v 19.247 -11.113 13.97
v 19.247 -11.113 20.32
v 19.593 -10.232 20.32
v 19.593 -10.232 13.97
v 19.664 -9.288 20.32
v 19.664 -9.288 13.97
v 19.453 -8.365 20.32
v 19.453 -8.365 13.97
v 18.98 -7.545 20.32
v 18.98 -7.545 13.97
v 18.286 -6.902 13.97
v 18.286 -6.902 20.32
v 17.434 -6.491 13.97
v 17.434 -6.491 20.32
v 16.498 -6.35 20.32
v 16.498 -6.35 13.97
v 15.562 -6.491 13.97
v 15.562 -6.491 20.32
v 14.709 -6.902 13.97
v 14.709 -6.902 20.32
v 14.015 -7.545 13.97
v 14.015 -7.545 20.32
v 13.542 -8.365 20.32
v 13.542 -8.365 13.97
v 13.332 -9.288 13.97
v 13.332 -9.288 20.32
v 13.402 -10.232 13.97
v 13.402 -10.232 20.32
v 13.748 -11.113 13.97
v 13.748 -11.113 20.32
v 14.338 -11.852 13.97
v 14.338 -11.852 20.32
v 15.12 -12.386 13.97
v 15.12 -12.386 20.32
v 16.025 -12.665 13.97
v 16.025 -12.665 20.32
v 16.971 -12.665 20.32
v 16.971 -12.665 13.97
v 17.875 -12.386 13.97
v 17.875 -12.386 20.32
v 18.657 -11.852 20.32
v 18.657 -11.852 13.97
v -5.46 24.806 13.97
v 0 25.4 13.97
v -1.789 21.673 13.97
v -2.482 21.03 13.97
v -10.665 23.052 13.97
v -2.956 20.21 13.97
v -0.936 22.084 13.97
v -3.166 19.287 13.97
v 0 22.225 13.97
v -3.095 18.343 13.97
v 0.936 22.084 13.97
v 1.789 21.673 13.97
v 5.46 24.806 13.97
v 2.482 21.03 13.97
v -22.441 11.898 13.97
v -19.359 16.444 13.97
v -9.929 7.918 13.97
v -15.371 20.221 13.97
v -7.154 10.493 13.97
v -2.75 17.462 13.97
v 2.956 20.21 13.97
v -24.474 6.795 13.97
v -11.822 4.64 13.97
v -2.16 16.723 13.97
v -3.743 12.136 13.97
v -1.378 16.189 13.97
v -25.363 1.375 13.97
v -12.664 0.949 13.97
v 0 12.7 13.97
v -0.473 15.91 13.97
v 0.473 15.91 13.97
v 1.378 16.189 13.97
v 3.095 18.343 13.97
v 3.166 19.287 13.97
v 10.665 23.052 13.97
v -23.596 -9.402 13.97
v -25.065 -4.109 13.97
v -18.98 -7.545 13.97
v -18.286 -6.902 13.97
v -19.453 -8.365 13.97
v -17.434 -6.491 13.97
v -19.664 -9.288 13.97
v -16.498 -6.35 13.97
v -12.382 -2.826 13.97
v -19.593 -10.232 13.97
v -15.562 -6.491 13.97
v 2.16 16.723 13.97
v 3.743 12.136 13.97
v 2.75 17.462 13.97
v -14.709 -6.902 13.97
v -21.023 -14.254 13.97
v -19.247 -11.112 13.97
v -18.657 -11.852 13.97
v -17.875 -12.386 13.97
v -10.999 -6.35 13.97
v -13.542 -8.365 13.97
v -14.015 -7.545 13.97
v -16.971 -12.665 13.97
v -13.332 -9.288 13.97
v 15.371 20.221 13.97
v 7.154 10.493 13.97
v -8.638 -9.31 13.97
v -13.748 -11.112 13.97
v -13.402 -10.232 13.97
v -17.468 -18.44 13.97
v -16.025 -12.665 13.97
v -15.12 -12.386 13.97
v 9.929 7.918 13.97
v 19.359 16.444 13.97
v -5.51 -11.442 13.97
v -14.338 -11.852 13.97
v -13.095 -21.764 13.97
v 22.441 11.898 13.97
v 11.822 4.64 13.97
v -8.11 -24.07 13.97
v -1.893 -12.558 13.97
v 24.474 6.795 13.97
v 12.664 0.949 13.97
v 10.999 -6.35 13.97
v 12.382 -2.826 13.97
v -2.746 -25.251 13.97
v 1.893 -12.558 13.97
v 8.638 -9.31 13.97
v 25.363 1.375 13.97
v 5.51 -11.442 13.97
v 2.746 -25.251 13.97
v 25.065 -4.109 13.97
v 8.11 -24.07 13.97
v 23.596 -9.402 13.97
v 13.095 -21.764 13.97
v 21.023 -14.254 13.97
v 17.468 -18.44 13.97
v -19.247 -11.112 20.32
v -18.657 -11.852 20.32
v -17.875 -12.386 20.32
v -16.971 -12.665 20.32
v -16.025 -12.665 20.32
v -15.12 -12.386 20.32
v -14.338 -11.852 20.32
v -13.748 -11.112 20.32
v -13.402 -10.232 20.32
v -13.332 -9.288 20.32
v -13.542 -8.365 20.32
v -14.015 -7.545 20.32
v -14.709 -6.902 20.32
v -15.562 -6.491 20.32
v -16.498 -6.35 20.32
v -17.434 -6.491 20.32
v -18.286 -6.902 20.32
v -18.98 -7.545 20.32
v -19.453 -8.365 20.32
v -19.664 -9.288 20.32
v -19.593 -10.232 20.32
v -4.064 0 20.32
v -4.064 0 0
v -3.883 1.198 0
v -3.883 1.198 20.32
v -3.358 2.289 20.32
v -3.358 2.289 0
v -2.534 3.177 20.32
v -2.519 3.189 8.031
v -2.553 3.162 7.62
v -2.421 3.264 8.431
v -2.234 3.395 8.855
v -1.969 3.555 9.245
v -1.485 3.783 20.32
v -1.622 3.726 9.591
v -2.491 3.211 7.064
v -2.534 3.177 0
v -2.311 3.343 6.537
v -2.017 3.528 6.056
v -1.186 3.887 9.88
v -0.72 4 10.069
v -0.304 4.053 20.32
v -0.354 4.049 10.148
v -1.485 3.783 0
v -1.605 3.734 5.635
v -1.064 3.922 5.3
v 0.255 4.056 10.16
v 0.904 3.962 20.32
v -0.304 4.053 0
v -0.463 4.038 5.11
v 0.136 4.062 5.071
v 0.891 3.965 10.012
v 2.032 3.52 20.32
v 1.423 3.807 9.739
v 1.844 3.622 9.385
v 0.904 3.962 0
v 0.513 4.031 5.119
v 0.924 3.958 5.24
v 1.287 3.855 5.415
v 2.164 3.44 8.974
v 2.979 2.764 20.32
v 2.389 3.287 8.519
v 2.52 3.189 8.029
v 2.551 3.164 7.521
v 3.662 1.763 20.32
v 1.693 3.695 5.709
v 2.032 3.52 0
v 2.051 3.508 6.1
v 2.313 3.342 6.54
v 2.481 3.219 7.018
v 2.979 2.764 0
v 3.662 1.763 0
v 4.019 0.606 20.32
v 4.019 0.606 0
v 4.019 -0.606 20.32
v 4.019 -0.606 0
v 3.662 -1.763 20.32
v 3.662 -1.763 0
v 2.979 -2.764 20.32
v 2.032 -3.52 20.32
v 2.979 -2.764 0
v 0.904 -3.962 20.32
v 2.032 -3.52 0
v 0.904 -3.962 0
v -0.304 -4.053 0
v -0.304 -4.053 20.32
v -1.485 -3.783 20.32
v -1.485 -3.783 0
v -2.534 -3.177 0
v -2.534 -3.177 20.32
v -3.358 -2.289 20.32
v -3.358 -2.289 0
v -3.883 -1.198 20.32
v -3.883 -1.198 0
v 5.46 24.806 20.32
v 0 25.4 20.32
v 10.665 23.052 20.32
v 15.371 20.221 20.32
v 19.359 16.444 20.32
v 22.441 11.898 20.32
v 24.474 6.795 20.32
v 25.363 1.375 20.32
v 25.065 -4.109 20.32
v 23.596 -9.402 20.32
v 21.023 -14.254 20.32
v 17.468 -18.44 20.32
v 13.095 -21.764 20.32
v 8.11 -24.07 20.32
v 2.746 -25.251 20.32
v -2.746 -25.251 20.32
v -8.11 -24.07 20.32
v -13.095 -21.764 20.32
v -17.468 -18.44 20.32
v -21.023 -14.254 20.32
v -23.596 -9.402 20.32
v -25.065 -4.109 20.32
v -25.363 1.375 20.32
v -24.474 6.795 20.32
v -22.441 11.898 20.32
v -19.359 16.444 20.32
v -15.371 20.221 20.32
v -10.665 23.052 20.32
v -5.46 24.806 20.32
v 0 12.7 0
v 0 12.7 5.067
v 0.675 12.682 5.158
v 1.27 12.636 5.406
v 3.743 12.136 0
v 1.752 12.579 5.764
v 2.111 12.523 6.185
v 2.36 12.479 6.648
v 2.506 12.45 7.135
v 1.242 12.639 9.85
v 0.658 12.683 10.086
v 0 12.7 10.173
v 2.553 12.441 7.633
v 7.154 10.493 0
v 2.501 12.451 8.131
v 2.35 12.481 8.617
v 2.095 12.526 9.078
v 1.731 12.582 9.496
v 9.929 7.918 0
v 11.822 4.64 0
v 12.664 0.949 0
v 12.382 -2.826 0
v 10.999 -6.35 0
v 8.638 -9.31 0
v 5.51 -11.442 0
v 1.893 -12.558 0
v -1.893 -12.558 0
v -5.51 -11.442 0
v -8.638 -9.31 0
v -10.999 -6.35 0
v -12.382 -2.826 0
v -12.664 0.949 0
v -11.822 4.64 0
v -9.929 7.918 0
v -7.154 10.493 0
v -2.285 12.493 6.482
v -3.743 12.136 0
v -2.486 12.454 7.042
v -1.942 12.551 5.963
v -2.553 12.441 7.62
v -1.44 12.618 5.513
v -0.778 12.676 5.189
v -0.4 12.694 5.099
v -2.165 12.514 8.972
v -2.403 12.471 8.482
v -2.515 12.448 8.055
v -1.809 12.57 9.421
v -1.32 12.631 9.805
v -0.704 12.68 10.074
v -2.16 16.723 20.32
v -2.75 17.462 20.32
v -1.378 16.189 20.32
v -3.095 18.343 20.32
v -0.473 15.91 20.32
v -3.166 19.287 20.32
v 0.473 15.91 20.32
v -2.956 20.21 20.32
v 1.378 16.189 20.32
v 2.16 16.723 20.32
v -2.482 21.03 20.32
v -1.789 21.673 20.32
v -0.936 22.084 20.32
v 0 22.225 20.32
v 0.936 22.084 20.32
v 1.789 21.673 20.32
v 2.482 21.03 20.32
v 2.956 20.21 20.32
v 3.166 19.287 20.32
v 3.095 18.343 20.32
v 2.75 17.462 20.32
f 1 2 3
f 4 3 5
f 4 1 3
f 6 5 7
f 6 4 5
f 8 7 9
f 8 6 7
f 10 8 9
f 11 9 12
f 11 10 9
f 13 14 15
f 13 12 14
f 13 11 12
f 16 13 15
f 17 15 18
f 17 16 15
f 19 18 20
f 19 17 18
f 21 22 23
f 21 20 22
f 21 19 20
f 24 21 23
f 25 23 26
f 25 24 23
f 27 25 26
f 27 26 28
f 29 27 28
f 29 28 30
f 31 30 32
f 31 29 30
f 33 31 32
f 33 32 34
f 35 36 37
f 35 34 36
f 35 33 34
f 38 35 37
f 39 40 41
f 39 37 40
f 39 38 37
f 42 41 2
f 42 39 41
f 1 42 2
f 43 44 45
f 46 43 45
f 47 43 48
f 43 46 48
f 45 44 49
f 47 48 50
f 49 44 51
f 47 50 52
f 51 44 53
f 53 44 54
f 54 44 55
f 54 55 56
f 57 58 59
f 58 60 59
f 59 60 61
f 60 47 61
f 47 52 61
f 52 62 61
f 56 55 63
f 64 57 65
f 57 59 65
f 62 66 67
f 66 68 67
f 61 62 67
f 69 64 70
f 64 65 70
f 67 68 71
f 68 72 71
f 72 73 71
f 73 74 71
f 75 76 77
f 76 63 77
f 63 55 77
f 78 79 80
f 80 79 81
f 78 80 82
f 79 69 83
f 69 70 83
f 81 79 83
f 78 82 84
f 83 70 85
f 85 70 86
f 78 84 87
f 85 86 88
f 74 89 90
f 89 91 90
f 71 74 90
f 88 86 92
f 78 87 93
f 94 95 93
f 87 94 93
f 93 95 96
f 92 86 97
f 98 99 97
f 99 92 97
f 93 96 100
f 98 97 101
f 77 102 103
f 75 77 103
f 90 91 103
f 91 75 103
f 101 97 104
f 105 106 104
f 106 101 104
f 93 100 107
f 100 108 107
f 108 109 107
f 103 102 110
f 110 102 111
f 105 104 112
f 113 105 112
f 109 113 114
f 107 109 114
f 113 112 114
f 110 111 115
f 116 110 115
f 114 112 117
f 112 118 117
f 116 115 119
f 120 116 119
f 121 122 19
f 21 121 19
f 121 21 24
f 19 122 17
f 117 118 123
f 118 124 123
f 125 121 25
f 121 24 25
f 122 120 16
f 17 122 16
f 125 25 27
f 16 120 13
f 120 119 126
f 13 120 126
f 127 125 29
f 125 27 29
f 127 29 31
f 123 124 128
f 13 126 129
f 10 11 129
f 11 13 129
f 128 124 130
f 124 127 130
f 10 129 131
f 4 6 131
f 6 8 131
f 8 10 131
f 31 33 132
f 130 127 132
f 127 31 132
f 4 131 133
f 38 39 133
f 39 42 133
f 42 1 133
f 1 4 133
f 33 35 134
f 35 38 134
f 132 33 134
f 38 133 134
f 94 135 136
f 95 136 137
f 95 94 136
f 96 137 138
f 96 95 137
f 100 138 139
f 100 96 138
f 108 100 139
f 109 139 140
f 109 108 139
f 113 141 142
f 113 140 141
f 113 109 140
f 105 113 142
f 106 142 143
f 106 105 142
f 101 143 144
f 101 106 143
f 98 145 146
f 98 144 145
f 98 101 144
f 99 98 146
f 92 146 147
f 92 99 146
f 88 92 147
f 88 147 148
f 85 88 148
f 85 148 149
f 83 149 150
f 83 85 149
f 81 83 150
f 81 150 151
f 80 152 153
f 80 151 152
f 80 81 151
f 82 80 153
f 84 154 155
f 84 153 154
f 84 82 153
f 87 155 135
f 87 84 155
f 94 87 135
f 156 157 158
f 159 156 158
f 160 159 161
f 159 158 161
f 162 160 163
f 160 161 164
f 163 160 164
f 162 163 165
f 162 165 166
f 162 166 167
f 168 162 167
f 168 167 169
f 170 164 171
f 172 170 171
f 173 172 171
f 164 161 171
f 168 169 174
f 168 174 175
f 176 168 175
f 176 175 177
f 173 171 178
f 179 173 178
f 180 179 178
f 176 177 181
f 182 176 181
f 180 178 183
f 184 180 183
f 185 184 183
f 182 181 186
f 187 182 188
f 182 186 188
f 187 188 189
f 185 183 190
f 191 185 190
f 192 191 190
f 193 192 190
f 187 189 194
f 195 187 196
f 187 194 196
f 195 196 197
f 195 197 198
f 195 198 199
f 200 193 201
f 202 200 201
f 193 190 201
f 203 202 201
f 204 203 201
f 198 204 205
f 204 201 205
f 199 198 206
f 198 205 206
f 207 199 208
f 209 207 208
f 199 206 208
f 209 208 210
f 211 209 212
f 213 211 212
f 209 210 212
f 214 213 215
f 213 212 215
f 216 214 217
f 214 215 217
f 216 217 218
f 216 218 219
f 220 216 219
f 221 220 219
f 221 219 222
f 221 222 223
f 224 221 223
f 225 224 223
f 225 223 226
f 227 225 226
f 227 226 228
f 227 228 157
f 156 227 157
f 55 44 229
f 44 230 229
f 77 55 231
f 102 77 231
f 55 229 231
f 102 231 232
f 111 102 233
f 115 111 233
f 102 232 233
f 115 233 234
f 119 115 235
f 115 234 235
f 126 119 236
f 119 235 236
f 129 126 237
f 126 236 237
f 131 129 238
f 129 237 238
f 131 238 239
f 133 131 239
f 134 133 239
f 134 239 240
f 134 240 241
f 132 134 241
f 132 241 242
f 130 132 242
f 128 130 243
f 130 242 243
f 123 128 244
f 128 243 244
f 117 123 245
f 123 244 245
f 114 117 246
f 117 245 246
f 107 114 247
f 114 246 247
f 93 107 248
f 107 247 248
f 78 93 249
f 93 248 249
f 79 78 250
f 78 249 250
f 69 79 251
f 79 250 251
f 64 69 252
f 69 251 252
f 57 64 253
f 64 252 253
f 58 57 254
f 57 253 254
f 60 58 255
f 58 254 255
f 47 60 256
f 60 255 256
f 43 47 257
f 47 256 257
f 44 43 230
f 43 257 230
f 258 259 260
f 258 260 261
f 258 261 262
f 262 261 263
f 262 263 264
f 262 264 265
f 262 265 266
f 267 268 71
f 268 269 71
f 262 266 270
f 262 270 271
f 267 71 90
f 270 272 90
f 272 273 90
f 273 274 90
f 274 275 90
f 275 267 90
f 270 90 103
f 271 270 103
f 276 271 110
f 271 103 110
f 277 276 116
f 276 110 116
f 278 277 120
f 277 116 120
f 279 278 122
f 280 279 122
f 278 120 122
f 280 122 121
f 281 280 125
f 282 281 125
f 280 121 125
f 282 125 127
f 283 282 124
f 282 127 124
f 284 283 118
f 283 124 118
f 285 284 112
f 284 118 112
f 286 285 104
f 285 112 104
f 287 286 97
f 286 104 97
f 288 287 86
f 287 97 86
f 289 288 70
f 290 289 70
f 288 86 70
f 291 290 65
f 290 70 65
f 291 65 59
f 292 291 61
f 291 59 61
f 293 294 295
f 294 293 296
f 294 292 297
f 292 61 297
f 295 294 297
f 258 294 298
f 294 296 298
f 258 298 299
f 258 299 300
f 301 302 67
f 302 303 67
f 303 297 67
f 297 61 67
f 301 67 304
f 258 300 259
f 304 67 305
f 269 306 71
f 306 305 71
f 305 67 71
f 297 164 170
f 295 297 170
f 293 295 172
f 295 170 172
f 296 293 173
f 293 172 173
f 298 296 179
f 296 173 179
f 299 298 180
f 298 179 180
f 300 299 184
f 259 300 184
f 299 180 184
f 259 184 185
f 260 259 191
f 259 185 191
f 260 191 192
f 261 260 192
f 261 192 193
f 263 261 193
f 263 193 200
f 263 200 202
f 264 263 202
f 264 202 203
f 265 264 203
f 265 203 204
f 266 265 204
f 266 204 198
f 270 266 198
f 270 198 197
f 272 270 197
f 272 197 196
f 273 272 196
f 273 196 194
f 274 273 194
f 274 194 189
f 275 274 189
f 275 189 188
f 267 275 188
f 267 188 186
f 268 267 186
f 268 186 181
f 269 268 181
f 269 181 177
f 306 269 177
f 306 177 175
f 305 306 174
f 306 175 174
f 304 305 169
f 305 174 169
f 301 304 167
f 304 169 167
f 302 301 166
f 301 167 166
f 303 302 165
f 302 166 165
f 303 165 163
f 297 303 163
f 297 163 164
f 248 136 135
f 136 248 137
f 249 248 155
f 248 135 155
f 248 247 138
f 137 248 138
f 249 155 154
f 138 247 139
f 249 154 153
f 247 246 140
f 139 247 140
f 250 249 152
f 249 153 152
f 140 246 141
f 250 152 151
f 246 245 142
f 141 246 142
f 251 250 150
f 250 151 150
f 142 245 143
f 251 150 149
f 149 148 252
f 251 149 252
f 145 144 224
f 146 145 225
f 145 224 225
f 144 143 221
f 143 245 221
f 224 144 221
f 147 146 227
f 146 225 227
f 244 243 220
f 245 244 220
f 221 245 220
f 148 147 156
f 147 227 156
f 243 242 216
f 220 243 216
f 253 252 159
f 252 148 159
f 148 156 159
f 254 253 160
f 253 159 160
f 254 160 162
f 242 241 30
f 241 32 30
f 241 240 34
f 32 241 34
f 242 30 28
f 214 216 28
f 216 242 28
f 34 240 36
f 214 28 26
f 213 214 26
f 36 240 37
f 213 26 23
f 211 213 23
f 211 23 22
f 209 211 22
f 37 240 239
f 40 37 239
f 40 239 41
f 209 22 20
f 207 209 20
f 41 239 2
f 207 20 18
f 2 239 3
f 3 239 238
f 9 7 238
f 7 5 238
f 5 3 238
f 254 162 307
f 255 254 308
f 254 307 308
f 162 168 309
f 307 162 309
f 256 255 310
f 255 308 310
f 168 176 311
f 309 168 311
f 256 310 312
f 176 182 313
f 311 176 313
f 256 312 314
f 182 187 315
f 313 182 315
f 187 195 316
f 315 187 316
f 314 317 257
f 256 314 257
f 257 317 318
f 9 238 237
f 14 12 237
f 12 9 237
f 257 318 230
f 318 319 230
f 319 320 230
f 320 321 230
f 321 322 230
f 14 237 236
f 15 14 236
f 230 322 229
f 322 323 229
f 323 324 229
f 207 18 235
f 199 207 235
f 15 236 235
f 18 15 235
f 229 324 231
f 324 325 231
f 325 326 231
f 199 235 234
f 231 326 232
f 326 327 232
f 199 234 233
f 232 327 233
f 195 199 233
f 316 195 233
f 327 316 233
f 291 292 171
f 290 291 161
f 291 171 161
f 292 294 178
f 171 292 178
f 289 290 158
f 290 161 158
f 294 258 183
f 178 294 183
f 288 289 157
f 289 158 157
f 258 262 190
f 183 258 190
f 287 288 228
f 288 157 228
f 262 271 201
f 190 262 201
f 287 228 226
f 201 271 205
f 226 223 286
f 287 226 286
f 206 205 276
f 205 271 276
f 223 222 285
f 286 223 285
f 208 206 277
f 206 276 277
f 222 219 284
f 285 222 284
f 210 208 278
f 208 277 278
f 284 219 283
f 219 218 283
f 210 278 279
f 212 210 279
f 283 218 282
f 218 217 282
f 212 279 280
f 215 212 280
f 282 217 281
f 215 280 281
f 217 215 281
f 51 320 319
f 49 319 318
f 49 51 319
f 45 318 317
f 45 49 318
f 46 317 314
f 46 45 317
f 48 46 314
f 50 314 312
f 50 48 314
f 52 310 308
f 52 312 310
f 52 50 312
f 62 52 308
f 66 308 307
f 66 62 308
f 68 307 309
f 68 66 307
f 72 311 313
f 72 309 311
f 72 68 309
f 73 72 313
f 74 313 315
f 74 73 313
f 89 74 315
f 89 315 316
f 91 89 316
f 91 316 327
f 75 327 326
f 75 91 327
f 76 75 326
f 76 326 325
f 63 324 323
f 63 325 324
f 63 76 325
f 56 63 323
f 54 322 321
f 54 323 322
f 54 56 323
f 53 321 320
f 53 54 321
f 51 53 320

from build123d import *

# Parameters (mm, degrees)
SKETCH3_R                   = 4.064
CUT_EXTRUDE1_DEPTH          = 21.32
F_1_4_20_TAPPED_HOLE1_D     = 5.1054
F_1_4_20_TAPPED_HOLE1_DEPTH = 10.16
F_1_4_20_TAPPED_HOLE1_TIP   = 1.533816902
CIRPATTERN1_COUNT           = 3


with BuildPart() as part:
    # Sketch1 → Revolve1 (revolve)
    with BuildSketch(Plane(origin=(0, 0, 0), x_dir=(0, 0, -1), z_dir=(1, 0, 0))):
        Polygon((0, 12.7), (-13.97, 12.7), (-13.97, 25.4), (-20.32, 25.4), (-20.32, 0), (0, 0), align=None)
    revolve(axis=Axis((0, 0, 20.32), (0, 0, -1)))

    # Sketch3 → Cut-Extrude1 (cut, through all)
    with BuildSketch(Plane(origin=(0, 0, 0), x_dir=(-1, 0, 0), z_dir=(0, 0, -1))):
        Circle(SKETCH3_R)
    extrude(amount=-CUT_EXTRUDE1_DEPTH, mode=Mode.SUBTRACT)

    # 1/4-20 Tapped Hole1
    with Locations(Plane(origin=(0, 12.7, 7.62), x_dir=(1, 0, 0), z_dir=(0, 1, 0))):
        with Locations((0, 0)):
            Hole(F_1_4_20_TAPPED_HOLE1_D / 2, depth=F_1_4_20_TAPPED_HOLE1_DEPTH)
            with Locations((0, 0, -(F_1_4_20_TAPPED_HOLE1_DEPTH + F_1_4_20_TAPPED_HOLE1_TIP / 2))):  # 118° drill point
                Cone(0, F_1_4_20_TAPPED_HOLE1_D / 2, F_1_4_20_TAPPED_HOLE1_TIP, mode=Mode.SUBTRACT)

    # Sketch7 → 1/4 (0.25) Diameter Hole1 (revolve, cut)
    with BuildSketch(Plane(origin=(0, 19.05, 13.97), x_dir=(0, 1, 0), z_dir=(1, 0, 0))):
        Polygon((0, 0), (0, 20.957732465), (3.175, 19.05), (3.175, 0), align=None)
    f_1_4_0_25_diameter_hole1 = revolve(axis=Axis((0, 19.05, 7.62), (0, 0, 1)), mode=Mode.SUBTRACT)

    # CirPattern1: 1/4 (0.25) Diameter Hole1 ×3 about axis
    cirpattern1_axis = Axis((0, 0, 0), (0, 0, 1))
    for i in range(1, CIRPATTERN1_COUNT):
        add(f_1_4_0_25_diameter_hole1.rotate(cirpattern1_axis, i * 360 / CIRPATTERN1_COUNT), mode=Mode.SUBTRACT)


solid = part.part
